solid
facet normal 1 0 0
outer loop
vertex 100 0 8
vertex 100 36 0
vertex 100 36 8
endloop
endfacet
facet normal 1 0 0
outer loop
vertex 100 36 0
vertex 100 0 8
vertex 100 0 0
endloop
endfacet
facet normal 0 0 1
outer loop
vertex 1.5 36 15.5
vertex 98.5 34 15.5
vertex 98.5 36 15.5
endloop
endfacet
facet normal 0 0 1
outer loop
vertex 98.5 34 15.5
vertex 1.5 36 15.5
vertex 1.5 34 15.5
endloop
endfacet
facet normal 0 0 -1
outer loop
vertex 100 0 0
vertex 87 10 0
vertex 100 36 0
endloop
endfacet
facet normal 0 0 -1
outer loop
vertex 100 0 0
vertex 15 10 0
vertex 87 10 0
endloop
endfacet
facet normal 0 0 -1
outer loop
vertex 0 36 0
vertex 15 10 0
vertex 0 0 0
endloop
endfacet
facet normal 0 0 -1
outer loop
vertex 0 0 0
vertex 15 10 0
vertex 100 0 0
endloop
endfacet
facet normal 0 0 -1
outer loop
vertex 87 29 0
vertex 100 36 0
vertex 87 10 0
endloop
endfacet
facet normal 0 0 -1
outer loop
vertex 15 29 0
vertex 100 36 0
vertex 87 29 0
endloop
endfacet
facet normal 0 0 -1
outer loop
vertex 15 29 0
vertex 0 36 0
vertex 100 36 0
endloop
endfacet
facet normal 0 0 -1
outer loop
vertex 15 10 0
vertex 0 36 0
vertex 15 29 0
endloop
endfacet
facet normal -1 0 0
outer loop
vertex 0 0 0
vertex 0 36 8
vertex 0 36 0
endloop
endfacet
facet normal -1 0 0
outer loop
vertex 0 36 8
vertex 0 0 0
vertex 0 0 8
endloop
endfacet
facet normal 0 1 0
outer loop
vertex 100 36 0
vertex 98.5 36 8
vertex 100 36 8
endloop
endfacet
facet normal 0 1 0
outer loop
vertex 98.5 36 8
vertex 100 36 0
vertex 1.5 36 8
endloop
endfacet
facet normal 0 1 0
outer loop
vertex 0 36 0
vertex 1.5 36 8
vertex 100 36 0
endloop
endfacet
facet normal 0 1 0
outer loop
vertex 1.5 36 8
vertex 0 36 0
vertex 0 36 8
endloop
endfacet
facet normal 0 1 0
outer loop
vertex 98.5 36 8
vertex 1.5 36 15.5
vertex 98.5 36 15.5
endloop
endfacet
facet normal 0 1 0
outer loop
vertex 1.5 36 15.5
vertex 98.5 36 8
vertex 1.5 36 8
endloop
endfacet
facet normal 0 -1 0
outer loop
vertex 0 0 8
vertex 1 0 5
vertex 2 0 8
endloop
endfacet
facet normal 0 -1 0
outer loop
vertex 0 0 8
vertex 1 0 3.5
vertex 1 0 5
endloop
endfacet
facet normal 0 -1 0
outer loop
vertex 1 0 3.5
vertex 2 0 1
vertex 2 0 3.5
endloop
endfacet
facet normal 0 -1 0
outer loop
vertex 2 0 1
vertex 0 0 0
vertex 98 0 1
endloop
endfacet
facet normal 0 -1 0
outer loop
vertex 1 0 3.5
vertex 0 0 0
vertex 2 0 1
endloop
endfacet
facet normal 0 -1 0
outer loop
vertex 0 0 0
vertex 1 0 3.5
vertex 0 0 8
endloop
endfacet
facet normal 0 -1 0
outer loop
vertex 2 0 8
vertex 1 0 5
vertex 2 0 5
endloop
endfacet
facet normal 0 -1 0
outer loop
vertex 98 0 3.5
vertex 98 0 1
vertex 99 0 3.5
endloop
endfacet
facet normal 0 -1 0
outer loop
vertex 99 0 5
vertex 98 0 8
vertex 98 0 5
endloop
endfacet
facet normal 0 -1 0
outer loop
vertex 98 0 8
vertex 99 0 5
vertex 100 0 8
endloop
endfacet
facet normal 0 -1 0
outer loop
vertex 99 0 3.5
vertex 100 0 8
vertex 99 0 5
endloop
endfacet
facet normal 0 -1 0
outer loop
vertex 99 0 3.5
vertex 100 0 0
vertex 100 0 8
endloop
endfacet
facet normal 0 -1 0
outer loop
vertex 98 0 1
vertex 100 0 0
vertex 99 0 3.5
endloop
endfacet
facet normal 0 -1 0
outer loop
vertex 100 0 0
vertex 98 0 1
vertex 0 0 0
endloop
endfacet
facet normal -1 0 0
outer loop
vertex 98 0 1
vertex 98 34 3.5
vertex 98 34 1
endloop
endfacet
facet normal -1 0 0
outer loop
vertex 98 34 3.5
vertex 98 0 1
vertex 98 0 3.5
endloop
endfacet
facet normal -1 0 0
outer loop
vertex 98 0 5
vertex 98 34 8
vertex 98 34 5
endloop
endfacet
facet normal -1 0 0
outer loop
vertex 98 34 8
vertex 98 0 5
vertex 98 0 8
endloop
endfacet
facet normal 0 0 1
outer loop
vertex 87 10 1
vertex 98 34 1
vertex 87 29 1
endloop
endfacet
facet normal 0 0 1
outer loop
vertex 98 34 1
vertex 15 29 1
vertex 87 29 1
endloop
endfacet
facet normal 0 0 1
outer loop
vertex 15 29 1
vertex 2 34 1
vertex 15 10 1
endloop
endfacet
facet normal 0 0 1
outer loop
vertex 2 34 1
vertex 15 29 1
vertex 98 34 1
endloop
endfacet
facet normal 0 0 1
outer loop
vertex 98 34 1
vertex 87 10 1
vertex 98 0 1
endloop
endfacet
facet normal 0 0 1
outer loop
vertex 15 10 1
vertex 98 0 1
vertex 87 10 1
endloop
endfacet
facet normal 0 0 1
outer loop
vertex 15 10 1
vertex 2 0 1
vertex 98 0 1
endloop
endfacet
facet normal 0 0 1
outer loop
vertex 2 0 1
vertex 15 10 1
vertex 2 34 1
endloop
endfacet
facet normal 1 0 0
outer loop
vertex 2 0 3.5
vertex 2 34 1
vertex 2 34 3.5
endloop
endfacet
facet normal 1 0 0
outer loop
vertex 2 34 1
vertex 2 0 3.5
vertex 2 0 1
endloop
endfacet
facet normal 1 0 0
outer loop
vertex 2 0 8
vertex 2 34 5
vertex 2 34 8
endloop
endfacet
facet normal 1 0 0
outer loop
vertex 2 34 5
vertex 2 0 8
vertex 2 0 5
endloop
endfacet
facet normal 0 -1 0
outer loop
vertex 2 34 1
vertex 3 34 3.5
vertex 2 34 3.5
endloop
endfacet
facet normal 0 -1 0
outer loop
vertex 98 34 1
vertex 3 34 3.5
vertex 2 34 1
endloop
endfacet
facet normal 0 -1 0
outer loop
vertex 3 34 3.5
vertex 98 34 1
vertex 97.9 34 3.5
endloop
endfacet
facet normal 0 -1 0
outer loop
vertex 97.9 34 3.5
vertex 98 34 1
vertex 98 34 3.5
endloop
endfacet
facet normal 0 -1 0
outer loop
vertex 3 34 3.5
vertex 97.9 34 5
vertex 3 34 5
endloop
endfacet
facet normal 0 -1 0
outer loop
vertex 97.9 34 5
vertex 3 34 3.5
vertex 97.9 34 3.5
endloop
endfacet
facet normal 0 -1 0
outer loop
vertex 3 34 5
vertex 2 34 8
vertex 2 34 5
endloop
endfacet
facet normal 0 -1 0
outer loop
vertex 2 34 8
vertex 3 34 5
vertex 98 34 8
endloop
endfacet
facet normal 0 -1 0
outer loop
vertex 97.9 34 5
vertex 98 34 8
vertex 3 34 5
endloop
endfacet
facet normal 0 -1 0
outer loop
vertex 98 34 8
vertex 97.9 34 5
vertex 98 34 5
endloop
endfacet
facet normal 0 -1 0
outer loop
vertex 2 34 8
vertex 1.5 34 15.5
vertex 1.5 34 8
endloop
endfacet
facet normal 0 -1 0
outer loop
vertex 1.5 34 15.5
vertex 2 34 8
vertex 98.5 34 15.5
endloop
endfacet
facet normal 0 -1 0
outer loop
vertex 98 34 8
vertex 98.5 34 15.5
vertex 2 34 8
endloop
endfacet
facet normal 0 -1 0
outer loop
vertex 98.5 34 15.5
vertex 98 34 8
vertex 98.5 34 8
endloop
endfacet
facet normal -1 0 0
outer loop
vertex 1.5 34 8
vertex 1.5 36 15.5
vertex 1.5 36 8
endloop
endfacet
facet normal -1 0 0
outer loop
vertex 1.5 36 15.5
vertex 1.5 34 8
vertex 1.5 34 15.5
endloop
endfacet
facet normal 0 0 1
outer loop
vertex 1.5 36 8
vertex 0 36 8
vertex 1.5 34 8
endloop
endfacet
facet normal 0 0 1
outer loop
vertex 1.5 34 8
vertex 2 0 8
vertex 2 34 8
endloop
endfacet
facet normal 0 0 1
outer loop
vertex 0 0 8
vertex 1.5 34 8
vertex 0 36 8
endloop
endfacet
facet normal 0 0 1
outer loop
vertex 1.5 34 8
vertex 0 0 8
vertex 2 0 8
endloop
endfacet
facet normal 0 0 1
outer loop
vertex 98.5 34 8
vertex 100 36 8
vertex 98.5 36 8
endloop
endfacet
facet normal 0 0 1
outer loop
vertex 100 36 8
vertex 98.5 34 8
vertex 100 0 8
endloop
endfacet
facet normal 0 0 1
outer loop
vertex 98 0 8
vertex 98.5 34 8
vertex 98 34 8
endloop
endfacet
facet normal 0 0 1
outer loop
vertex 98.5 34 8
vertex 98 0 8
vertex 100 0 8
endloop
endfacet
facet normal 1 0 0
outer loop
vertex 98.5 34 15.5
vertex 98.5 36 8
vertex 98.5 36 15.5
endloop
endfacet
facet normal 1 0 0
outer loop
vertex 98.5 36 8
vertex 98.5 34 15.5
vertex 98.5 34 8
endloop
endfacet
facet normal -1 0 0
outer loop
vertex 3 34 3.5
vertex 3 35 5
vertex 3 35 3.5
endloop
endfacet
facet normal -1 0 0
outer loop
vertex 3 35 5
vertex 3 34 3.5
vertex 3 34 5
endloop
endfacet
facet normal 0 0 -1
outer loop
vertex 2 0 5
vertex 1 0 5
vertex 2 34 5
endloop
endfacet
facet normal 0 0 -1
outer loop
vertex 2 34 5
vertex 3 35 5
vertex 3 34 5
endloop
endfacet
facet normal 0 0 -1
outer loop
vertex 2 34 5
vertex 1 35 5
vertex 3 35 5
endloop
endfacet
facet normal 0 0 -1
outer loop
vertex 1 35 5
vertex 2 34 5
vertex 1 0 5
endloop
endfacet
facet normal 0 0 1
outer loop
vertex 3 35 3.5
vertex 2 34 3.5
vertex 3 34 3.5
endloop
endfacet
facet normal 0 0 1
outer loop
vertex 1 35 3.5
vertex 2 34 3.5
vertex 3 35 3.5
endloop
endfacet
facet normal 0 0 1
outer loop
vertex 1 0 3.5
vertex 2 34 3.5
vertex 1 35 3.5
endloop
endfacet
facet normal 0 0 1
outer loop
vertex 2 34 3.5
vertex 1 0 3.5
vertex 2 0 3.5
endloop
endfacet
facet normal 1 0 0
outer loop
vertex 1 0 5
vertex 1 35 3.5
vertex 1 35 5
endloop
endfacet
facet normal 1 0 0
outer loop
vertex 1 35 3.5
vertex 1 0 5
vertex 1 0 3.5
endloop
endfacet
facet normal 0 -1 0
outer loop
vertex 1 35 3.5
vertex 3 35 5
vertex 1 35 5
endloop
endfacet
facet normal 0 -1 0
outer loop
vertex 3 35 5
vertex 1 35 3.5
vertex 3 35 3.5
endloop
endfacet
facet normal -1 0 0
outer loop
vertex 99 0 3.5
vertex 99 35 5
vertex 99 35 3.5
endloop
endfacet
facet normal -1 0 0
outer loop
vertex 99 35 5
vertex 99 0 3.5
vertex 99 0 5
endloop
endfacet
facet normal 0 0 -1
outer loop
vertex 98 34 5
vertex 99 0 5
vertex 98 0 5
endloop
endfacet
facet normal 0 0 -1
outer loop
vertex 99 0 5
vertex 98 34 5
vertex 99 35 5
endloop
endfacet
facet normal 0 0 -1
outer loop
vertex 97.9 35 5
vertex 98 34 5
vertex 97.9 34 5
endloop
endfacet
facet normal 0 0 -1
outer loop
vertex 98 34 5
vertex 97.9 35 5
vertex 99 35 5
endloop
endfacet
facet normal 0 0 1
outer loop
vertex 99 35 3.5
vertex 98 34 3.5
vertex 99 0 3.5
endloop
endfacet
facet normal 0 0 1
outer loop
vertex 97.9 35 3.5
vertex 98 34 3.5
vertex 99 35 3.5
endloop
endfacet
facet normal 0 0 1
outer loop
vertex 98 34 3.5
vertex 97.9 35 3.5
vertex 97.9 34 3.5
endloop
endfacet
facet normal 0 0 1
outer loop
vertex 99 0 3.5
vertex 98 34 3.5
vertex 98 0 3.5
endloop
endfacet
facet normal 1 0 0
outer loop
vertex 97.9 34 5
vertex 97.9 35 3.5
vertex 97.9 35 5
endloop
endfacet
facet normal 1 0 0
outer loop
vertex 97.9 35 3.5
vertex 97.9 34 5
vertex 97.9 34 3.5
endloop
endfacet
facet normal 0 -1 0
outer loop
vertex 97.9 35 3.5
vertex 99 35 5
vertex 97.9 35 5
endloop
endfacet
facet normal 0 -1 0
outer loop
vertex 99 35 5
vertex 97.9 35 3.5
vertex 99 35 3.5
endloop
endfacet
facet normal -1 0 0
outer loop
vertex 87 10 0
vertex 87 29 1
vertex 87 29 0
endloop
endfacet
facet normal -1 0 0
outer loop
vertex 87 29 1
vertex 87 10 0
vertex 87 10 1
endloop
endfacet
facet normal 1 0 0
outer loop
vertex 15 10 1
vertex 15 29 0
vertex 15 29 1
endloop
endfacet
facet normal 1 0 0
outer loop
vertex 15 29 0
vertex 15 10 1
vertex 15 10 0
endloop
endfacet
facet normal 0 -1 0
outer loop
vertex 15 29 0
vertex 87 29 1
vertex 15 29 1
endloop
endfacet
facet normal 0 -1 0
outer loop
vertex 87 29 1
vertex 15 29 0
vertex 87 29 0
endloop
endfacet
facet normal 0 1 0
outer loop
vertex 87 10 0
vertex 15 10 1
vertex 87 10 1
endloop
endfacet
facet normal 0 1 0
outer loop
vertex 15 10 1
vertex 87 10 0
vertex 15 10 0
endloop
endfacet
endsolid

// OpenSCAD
/*
Revisions by rogerw-gh to make case and display building easier.
*/
view_part = 0; //[0:front,1:frame]

/* [Hidden] */

$fa = 1;
$fs = 0.4;
cd =0.1;
pa = 0.3;
front_x = 100;
front_y = 38;
front_z = 15.5;
back_x = 97.5;
back_y = 34.5;
screw_hole_x = 4;
screw_hole_y = 3;
hole_x_pitch = back_x - 2*screw_hole_x;
hole_y_pitch = back_y - 2*screw_hole_y;
screw_hole_dia = 2+pa;
bolt_round = 40;


if (view_part == 0 ) new_front ();
    
if (view_part == 1 ) new_frame ();
    
module frame_legs () {
    difference () {
       union () {
           //two legs
        translate ([25,front_y-1,front_z/2-5])
            cube ([6,10,6]);
        translate ([70,front_y-1,front_z/2-5])
            cube ([6,10,6]);
           //base
        translate ([22,front_y+8.5,0])
            cube ([56,2,front_z-3]);
        }//end union 
        translate ([27,front_y-2,front_z/2-3])
            cube ([2,15,2]);
        translate ([72,front_y-2,front_z/2-3])
            cube ([2,15,2]);
    }//
    //absolute positioning 
    
    
}//end module
    
module new_frame () {
    difference () {
        cube ([front_x,front_y,front_z]);
        //back
        translate ([-cd*2,-cd,7.5]) cube([110,front_y-1.5+cd,20]);
        
        //shallow recess in back
        translate ([1,-cd,-cd]) cube([front_x-2,37,2+cd]);
        //create flange in back
        translate ([1,-cd,-cd]) cube([front_x-2,2,12+cd]);
        //create end steps for back to screw into
        translate ([10,-cd,-cd]) cube([front_x-20,37.1,6.5+cd]);
        //slot
        translate ([1,8,-cd]) cube([6,20,12+cd]);
        //extend slot horizontally to enable fit of electronics
        translate ([2,15,0]) cube([30,8,10]);
        //slot tidy up
        translate ([1,8,-cd]) cube([10,20,6.5+cd]);
        //holes 
        translate([screw_hole_x+1,screw_hole_y+2,-cd])
            cylinder (d=screw_hole_dia,h=10,$fn=12);
        
        translate([1+hole_x_pitch+screw_hole_x,screw_hole_y+2,-cd])
            cylinder (d=screw_hole_dia,h=10,$fn=12);
        
        translate([1+screw_hole_x,screw_hole_y+2+hole_y_pitch,-cd])
            cylinder (d=screw_hole_dia,h=10,$fn=12);
        translate([1+hole_x_pitch+screw_hole_x,screw_hole_y+2+hole_y_pitch,-cd])
            cylinder (d=screw_hole_dia,h=10,$fn=12);
         
         //cable_holes
                translate ([27,front_y-10,front_z/2-3])
        cube ([2,15,2]);
                translate ([72,front_y-10,front_z/2-3])
        cube ([2,15,2]);
    }//end diff
    frame_legs ();
}//end module



module new_front () {
    top_thick = 2;
    difference () {
        cube ([front_x,front_y-top_thick,front_z]);
        
        translate ([2,-cd,1])
            cube ([96,front_y-2-top_thick+cd,20]);//remove inner
        
        //small LH cutout
        translate ([-cd,-cd,8])
            cube ([1.5+cd,front_y+1+cd,10]);//LH end cleanup
        //make inside flush
        translate ([-cd,-cd,8])
            cube ([5,front_y-2-top_thick+cd,10]);//LH end cleanup
        
        //small RH cutout
        translate ([98.5,-cd,8])
            cube ([1.5+cd,front_y+1+cd,10]);//RH end cleanup
        //make inside flush
        translate ([97,-cd,8])
            cube ([5,front_y-2-top_thick+cd,10]);//RH end cleanup
        
        //board slots
        
        translate ([1,-cd,3.5])
            cube([2,front_y-3+cd,1.5]);
        translate ([98-cd,-cd,3.5])
            cube([1+cd,front_y-3+cd,1.5]);
            
        //front display window
        translate ([15,10,-cd])
            cube ([72,19,5]);      
        
    }//end diff
}//end module

module old_front () {
difference(){
    cube([105,2,39]);
    translate([16.95,-1,11.34])
        cube([71.10,4,19.26]);//first make difference work properly by offsetting the cube into Y and making the cube cut right through the panel.
}
rotate([270,0,0])
    translate([5.25,-5,2])
        cylinder(h=6,r=1.5);
rotate([270,0,0])
    translate([5.25,,-34,2])
        cylinder(h=6,r=1.5);
rotate([270,0,0])
    translate([99.25,-5,2])
        cylinder(h=6,r=1.5);
rotate([270,0,0])
    translate([99.25,-34,2])
        cylinder(h=6,r=1.5);

}//end module
